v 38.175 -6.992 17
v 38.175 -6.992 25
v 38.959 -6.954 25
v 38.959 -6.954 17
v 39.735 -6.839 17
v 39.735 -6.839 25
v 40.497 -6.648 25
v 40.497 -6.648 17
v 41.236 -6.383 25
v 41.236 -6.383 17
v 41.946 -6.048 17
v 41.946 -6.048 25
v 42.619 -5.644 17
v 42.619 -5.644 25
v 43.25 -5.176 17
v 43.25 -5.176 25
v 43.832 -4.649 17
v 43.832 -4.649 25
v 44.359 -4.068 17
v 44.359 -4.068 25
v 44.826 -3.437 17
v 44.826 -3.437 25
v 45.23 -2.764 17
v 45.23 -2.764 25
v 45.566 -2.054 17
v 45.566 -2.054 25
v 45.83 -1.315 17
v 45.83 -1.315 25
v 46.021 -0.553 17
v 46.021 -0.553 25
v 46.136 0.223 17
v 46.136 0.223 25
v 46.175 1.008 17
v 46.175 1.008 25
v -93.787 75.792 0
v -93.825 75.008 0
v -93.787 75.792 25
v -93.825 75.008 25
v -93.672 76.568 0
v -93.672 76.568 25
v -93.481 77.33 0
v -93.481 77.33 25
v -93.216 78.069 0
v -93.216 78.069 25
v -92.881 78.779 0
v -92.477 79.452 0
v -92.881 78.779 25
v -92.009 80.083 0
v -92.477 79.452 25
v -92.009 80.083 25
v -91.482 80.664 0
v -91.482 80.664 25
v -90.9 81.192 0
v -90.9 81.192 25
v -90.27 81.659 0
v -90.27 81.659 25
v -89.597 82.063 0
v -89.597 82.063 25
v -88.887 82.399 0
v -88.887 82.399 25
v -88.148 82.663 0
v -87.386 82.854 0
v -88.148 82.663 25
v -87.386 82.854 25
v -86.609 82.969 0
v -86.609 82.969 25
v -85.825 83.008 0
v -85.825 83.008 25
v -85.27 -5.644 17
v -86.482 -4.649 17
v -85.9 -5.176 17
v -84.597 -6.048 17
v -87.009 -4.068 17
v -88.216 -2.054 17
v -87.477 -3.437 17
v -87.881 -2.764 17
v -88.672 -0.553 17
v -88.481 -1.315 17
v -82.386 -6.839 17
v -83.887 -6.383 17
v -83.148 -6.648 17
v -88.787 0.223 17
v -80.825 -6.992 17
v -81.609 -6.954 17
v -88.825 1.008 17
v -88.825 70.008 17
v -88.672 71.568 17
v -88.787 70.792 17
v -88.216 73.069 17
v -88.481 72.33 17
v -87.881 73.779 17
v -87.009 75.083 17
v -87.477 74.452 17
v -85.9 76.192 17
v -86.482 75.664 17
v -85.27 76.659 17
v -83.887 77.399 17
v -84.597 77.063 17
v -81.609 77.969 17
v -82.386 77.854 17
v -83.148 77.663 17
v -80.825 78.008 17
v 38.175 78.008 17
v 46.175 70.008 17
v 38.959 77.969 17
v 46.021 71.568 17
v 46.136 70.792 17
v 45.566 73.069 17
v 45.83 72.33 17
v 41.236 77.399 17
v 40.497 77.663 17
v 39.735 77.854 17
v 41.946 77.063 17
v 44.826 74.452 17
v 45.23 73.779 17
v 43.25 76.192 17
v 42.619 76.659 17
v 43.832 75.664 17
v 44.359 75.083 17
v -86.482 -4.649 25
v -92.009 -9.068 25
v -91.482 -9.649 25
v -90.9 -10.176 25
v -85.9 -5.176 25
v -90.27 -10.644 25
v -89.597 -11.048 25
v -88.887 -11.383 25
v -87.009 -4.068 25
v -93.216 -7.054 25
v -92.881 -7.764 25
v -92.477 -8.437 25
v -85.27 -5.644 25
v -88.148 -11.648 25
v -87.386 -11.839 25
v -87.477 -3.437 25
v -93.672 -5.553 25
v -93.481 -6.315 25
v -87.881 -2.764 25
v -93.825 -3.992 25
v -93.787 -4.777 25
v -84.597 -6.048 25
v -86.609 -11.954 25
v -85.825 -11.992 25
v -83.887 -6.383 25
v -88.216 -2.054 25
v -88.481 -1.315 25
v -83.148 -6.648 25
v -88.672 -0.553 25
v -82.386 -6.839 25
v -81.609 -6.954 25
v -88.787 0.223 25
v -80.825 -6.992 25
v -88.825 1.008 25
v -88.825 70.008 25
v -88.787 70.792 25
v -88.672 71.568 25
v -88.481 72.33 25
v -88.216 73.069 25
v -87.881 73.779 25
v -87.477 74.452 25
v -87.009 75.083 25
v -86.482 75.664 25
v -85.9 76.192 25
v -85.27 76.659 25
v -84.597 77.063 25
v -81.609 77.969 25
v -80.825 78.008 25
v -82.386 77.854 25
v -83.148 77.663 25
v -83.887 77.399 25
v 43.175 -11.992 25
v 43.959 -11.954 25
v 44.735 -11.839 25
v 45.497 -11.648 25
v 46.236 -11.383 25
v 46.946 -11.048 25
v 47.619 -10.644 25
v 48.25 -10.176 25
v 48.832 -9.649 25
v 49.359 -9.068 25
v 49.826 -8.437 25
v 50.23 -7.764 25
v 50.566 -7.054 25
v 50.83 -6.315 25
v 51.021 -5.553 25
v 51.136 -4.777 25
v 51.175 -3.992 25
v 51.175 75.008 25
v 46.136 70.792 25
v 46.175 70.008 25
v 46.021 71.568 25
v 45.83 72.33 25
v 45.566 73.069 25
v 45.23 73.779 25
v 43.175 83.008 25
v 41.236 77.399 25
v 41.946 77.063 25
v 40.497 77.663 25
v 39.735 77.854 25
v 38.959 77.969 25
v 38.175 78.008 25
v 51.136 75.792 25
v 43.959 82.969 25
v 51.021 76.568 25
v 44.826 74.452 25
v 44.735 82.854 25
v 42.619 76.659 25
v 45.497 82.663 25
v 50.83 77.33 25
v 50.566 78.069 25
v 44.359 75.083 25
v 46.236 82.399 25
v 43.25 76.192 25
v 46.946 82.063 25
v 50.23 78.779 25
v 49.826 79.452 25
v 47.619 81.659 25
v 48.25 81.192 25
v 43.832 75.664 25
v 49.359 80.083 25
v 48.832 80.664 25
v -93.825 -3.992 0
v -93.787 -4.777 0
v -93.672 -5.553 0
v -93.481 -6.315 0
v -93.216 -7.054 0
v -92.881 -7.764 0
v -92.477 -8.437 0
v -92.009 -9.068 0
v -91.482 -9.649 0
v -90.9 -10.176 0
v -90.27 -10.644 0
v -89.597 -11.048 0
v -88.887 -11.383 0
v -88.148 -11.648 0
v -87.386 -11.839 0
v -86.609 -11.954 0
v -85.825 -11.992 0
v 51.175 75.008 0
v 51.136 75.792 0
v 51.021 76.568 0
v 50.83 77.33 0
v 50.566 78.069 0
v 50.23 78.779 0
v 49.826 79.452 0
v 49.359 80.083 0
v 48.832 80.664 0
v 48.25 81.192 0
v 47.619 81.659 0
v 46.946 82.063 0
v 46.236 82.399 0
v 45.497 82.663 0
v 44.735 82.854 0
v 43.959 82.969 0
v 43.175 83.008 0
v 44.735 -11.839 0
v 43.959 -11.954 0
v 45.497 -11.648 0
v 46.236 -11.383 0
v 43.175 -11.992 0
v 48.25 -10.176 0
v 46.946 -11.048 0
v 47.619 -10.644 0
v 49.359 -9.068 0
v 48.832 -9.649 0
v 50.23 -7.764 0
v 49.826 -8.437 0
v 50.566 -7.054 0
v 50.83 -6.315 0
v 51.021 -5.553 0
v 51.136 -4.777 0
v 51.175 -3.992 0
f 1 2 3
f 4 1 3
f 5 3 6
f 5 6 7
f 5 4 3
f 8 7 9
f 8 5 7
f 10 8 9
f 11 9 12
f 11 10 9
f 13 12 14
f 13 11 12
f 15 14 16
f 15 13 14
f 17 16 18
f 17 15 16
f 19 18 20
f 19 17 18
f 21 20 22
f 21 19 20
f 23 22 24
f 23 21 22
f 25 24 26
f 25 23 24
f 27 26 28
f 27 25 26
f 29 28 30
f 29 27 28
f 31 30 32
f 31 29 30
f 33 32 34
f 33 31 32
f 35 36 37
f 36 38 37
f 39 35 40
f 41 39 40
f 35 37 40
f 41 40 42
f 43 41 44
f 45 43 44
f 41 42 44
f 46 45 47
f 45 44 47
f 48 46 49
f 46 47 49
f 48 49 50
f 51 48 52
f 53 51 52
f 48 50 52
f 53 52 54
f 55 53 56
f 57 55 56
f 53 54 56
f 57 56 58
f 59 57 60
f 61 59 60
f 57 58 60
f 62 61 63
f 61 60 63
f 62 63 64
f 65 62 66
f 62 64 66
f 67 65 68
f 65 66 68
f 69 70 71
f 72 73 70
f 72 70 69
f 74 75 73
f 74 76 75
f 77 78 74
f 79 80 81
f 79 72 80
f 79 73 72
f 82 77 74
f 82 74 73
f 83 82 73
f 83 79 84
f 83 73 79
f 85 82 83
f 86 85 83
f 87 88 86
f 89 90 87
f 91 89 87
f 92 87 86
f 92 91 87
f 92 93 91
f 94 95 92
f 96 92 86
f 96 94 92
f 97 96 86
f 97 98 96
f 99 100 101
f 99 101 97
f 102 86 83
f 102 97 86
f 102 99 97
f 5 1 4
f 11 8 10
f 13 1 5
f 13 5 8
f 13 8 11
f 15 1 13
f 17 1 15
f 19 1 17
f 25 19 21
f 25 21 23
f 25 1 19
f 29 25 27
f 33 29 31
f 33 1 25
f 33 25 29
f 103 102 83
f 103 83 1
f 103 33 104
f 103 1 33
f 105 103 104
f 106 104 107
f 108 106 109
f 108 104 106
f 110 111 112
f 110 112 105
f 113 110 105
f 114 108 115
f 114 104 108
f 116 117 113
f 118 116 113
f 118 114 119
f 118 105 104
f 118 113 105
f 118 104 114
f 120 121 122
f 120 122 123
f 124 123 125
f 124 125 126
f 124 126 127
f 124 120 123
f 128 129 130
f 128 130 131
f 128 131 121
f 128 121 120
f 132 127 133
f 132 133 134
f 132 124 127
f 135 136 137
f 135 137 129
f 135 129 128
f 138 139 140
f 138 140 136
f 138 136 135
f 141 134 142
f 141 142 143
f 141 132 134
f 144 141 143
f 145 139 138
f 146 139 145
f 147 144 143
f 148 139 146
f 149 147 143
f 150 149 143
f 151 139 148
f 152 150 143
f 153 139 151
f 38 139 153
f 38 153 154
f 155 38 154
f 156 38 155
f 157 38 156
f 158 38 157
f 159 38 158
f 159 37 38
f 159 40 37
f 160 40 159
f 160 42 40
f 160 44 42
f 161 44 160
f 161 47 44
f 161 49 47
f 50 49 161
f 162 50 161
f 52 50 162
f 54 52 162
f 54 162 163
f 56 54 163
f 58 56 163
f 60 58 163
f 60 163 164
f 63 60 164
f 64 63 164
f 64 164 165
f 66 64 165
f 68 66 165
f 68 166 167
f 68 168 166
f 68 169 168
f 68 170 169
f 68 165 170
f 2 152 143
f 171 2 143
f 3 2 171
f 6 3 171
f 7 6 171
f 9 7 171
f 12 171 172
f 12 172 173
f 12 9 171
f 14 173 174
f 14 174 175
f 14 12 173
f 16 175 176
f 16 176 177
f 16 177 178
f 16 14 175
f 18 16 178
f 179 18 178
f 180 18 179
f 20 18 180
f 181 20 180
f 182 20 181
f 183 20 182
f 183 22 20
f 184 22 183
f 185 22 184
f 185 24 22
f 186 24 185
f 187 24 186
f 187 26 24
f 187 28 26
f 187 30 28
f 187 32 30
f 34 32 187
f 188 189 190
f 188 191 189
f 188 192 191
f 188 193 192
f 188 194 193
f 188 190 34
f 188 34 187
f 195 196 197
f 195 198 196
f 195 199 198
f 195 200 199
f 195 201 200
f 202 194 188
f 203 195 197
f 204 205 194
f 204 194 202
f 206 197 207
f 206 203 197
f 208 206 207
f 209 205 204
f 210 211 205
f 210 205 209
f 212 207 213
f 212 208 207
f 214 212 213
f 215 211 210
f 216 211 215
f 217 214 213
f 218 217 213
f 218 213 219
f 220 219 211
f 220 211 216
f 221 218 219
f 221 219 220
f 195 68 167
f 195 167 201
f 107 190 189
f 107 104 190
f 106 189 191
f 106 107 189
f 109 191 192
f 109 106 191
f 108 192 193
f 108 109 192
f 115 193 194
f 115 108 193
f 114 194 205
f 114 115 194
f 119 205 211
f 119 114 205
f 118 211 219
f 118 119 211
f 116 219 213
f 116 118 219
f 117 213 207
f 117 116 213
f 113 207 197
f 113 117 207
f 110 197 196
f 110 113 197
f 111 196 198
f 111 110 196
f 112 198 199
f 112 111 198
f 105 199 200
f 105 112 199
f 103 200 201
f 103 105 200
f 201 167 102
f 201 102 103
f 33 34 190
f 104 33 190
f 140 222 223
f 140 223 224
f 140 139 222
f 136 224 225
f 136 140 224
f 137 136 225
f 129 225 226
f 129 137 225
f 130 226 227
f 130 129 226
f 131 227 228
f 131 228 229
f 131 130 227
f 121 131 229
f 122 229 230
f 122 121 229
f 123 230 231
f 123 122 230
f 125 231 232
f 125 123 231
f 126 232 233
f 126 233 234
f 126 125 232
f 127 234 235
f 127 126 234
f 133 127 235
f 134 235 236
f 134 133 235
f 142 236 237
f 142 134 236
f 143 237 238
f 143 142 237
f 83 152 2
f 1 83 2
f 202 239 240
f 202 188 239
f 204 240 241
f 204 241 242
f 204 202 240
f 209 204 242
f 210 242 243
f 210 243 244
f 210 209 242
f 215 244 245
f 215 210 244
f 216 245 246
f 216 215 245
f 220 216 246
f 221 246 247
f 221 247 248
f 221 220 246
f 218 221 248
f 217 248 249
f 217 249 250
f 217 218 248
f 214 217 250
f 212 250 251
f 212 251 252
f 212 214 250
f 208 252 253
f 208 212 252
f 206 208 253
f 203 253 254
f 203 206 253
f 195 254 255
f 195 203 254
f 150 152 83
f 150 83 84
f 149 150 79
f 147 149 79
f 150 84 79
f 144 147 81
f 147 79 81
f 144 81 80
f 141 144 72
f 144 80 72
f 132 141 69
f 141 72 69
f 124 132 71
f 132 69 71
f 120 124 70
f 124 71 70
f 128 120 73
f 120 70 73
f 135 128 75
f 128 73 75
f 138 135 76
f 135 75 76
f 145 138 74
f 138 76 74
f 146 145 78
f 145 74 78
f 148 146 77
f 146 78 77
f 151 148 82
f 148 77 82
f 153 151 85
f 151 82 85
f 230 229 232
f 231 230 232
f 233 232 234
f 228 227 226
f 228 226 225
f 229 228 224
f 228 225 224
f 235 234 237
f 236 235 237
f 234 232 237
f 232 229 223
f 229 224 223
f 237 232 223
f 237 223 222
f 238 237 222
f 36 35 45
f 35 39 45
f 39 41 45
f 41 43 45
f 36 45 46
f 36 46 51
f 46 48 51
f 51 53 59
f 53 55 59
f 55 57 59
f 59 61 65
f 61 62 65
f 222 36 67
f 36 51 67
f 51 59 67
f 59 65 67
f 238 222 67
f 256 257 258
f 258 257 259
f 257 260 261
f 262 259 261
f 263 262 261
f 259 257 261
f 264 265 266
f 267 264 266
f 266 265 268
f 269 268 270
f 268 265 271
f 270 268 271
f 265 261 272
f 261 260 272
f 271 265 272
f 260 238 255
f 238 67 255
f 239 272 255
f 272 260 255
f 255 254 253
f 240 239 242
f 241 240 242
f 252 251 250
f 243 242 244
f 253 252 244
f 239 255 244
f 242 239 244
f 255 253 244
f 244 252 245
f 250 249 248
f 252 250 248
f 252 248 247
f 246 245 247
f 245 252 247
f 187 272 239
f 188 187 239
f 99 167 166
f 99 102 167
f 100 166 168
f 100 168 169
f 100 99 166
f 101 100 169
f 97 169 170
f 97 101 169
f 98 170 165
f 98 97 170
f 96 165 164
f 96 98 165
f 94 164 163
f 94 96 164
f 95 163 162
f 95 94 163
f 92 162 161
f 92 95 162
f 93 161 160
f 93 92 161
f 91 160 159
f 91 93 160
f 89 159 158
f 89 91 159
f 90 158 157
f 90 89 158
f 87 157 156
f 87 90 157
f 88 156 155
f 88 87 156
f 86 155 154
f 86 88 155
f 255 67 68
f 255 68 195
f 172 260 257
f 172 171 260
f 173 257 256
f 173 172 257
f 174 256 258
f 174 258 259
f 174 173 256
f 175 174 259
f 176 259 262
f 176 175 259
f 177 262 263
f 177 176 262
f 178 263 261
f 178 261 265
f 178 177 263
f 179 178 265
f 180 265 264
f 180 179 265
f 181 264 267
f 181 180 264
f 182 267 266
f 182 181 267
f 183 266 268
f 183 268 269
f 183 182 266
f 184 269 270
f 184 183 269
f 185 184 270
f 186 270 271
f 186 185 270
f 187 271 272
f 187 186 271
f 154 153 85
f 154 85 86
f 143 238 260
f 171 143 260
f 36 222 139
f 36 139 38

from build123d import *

# Parameters (mm, degrees)
F0_W     = 145
F0_H     = 95
F1_DEPTH = 25
F2_R     = 8
F3_W     = 135
F3_H     = 85
F4_DEPTH = 8
F5_R     = 8


with BuildPart() as f1:
    # F0 (on Top) → F1 (new body)
    with BuildSketch(Plane.XY):
        with Locations((-21.325343, 35.507629)):
            Rectangle(F0_W, F0_H)
    extrude(amount=F1_DEPTH)

    # F2
    f2_edges = [f1.edges().sort_by_distance(p)[0] for p in [
        (-93.825343, -11.992371, 12.5),
        (51.174657, -11.992371, 12.5),
        (51.174657, 83.007629, 12.5),
        (-93.825343, 83.007629, 12.5),
    ]]
    fillet(f2_edges, radius=F2_R)

    # F3 (on face) → F4 (cut)
    with BuildSketch(Plane.XY.offset(25)):
        with Locations((-21.325343, 35.507629)):
            Rectangle(F3_W, F3_H)
    extrude(amount=-F4_DEPTH, mode=Mode.SUBTRACT)

    # F5
    f5_edges = [f1.edges().sort_by_distance(p)[0] for p in [
        (-88.825343, 78.007629, 21),
        (-88.825343, -6.992371, 21),
        (46.174657, 78.007629, 21),
        (46.174657, -6.992371, 21),
    ]]
    fillet(f5_edges, radius=F5_R)


solid = f1.part
